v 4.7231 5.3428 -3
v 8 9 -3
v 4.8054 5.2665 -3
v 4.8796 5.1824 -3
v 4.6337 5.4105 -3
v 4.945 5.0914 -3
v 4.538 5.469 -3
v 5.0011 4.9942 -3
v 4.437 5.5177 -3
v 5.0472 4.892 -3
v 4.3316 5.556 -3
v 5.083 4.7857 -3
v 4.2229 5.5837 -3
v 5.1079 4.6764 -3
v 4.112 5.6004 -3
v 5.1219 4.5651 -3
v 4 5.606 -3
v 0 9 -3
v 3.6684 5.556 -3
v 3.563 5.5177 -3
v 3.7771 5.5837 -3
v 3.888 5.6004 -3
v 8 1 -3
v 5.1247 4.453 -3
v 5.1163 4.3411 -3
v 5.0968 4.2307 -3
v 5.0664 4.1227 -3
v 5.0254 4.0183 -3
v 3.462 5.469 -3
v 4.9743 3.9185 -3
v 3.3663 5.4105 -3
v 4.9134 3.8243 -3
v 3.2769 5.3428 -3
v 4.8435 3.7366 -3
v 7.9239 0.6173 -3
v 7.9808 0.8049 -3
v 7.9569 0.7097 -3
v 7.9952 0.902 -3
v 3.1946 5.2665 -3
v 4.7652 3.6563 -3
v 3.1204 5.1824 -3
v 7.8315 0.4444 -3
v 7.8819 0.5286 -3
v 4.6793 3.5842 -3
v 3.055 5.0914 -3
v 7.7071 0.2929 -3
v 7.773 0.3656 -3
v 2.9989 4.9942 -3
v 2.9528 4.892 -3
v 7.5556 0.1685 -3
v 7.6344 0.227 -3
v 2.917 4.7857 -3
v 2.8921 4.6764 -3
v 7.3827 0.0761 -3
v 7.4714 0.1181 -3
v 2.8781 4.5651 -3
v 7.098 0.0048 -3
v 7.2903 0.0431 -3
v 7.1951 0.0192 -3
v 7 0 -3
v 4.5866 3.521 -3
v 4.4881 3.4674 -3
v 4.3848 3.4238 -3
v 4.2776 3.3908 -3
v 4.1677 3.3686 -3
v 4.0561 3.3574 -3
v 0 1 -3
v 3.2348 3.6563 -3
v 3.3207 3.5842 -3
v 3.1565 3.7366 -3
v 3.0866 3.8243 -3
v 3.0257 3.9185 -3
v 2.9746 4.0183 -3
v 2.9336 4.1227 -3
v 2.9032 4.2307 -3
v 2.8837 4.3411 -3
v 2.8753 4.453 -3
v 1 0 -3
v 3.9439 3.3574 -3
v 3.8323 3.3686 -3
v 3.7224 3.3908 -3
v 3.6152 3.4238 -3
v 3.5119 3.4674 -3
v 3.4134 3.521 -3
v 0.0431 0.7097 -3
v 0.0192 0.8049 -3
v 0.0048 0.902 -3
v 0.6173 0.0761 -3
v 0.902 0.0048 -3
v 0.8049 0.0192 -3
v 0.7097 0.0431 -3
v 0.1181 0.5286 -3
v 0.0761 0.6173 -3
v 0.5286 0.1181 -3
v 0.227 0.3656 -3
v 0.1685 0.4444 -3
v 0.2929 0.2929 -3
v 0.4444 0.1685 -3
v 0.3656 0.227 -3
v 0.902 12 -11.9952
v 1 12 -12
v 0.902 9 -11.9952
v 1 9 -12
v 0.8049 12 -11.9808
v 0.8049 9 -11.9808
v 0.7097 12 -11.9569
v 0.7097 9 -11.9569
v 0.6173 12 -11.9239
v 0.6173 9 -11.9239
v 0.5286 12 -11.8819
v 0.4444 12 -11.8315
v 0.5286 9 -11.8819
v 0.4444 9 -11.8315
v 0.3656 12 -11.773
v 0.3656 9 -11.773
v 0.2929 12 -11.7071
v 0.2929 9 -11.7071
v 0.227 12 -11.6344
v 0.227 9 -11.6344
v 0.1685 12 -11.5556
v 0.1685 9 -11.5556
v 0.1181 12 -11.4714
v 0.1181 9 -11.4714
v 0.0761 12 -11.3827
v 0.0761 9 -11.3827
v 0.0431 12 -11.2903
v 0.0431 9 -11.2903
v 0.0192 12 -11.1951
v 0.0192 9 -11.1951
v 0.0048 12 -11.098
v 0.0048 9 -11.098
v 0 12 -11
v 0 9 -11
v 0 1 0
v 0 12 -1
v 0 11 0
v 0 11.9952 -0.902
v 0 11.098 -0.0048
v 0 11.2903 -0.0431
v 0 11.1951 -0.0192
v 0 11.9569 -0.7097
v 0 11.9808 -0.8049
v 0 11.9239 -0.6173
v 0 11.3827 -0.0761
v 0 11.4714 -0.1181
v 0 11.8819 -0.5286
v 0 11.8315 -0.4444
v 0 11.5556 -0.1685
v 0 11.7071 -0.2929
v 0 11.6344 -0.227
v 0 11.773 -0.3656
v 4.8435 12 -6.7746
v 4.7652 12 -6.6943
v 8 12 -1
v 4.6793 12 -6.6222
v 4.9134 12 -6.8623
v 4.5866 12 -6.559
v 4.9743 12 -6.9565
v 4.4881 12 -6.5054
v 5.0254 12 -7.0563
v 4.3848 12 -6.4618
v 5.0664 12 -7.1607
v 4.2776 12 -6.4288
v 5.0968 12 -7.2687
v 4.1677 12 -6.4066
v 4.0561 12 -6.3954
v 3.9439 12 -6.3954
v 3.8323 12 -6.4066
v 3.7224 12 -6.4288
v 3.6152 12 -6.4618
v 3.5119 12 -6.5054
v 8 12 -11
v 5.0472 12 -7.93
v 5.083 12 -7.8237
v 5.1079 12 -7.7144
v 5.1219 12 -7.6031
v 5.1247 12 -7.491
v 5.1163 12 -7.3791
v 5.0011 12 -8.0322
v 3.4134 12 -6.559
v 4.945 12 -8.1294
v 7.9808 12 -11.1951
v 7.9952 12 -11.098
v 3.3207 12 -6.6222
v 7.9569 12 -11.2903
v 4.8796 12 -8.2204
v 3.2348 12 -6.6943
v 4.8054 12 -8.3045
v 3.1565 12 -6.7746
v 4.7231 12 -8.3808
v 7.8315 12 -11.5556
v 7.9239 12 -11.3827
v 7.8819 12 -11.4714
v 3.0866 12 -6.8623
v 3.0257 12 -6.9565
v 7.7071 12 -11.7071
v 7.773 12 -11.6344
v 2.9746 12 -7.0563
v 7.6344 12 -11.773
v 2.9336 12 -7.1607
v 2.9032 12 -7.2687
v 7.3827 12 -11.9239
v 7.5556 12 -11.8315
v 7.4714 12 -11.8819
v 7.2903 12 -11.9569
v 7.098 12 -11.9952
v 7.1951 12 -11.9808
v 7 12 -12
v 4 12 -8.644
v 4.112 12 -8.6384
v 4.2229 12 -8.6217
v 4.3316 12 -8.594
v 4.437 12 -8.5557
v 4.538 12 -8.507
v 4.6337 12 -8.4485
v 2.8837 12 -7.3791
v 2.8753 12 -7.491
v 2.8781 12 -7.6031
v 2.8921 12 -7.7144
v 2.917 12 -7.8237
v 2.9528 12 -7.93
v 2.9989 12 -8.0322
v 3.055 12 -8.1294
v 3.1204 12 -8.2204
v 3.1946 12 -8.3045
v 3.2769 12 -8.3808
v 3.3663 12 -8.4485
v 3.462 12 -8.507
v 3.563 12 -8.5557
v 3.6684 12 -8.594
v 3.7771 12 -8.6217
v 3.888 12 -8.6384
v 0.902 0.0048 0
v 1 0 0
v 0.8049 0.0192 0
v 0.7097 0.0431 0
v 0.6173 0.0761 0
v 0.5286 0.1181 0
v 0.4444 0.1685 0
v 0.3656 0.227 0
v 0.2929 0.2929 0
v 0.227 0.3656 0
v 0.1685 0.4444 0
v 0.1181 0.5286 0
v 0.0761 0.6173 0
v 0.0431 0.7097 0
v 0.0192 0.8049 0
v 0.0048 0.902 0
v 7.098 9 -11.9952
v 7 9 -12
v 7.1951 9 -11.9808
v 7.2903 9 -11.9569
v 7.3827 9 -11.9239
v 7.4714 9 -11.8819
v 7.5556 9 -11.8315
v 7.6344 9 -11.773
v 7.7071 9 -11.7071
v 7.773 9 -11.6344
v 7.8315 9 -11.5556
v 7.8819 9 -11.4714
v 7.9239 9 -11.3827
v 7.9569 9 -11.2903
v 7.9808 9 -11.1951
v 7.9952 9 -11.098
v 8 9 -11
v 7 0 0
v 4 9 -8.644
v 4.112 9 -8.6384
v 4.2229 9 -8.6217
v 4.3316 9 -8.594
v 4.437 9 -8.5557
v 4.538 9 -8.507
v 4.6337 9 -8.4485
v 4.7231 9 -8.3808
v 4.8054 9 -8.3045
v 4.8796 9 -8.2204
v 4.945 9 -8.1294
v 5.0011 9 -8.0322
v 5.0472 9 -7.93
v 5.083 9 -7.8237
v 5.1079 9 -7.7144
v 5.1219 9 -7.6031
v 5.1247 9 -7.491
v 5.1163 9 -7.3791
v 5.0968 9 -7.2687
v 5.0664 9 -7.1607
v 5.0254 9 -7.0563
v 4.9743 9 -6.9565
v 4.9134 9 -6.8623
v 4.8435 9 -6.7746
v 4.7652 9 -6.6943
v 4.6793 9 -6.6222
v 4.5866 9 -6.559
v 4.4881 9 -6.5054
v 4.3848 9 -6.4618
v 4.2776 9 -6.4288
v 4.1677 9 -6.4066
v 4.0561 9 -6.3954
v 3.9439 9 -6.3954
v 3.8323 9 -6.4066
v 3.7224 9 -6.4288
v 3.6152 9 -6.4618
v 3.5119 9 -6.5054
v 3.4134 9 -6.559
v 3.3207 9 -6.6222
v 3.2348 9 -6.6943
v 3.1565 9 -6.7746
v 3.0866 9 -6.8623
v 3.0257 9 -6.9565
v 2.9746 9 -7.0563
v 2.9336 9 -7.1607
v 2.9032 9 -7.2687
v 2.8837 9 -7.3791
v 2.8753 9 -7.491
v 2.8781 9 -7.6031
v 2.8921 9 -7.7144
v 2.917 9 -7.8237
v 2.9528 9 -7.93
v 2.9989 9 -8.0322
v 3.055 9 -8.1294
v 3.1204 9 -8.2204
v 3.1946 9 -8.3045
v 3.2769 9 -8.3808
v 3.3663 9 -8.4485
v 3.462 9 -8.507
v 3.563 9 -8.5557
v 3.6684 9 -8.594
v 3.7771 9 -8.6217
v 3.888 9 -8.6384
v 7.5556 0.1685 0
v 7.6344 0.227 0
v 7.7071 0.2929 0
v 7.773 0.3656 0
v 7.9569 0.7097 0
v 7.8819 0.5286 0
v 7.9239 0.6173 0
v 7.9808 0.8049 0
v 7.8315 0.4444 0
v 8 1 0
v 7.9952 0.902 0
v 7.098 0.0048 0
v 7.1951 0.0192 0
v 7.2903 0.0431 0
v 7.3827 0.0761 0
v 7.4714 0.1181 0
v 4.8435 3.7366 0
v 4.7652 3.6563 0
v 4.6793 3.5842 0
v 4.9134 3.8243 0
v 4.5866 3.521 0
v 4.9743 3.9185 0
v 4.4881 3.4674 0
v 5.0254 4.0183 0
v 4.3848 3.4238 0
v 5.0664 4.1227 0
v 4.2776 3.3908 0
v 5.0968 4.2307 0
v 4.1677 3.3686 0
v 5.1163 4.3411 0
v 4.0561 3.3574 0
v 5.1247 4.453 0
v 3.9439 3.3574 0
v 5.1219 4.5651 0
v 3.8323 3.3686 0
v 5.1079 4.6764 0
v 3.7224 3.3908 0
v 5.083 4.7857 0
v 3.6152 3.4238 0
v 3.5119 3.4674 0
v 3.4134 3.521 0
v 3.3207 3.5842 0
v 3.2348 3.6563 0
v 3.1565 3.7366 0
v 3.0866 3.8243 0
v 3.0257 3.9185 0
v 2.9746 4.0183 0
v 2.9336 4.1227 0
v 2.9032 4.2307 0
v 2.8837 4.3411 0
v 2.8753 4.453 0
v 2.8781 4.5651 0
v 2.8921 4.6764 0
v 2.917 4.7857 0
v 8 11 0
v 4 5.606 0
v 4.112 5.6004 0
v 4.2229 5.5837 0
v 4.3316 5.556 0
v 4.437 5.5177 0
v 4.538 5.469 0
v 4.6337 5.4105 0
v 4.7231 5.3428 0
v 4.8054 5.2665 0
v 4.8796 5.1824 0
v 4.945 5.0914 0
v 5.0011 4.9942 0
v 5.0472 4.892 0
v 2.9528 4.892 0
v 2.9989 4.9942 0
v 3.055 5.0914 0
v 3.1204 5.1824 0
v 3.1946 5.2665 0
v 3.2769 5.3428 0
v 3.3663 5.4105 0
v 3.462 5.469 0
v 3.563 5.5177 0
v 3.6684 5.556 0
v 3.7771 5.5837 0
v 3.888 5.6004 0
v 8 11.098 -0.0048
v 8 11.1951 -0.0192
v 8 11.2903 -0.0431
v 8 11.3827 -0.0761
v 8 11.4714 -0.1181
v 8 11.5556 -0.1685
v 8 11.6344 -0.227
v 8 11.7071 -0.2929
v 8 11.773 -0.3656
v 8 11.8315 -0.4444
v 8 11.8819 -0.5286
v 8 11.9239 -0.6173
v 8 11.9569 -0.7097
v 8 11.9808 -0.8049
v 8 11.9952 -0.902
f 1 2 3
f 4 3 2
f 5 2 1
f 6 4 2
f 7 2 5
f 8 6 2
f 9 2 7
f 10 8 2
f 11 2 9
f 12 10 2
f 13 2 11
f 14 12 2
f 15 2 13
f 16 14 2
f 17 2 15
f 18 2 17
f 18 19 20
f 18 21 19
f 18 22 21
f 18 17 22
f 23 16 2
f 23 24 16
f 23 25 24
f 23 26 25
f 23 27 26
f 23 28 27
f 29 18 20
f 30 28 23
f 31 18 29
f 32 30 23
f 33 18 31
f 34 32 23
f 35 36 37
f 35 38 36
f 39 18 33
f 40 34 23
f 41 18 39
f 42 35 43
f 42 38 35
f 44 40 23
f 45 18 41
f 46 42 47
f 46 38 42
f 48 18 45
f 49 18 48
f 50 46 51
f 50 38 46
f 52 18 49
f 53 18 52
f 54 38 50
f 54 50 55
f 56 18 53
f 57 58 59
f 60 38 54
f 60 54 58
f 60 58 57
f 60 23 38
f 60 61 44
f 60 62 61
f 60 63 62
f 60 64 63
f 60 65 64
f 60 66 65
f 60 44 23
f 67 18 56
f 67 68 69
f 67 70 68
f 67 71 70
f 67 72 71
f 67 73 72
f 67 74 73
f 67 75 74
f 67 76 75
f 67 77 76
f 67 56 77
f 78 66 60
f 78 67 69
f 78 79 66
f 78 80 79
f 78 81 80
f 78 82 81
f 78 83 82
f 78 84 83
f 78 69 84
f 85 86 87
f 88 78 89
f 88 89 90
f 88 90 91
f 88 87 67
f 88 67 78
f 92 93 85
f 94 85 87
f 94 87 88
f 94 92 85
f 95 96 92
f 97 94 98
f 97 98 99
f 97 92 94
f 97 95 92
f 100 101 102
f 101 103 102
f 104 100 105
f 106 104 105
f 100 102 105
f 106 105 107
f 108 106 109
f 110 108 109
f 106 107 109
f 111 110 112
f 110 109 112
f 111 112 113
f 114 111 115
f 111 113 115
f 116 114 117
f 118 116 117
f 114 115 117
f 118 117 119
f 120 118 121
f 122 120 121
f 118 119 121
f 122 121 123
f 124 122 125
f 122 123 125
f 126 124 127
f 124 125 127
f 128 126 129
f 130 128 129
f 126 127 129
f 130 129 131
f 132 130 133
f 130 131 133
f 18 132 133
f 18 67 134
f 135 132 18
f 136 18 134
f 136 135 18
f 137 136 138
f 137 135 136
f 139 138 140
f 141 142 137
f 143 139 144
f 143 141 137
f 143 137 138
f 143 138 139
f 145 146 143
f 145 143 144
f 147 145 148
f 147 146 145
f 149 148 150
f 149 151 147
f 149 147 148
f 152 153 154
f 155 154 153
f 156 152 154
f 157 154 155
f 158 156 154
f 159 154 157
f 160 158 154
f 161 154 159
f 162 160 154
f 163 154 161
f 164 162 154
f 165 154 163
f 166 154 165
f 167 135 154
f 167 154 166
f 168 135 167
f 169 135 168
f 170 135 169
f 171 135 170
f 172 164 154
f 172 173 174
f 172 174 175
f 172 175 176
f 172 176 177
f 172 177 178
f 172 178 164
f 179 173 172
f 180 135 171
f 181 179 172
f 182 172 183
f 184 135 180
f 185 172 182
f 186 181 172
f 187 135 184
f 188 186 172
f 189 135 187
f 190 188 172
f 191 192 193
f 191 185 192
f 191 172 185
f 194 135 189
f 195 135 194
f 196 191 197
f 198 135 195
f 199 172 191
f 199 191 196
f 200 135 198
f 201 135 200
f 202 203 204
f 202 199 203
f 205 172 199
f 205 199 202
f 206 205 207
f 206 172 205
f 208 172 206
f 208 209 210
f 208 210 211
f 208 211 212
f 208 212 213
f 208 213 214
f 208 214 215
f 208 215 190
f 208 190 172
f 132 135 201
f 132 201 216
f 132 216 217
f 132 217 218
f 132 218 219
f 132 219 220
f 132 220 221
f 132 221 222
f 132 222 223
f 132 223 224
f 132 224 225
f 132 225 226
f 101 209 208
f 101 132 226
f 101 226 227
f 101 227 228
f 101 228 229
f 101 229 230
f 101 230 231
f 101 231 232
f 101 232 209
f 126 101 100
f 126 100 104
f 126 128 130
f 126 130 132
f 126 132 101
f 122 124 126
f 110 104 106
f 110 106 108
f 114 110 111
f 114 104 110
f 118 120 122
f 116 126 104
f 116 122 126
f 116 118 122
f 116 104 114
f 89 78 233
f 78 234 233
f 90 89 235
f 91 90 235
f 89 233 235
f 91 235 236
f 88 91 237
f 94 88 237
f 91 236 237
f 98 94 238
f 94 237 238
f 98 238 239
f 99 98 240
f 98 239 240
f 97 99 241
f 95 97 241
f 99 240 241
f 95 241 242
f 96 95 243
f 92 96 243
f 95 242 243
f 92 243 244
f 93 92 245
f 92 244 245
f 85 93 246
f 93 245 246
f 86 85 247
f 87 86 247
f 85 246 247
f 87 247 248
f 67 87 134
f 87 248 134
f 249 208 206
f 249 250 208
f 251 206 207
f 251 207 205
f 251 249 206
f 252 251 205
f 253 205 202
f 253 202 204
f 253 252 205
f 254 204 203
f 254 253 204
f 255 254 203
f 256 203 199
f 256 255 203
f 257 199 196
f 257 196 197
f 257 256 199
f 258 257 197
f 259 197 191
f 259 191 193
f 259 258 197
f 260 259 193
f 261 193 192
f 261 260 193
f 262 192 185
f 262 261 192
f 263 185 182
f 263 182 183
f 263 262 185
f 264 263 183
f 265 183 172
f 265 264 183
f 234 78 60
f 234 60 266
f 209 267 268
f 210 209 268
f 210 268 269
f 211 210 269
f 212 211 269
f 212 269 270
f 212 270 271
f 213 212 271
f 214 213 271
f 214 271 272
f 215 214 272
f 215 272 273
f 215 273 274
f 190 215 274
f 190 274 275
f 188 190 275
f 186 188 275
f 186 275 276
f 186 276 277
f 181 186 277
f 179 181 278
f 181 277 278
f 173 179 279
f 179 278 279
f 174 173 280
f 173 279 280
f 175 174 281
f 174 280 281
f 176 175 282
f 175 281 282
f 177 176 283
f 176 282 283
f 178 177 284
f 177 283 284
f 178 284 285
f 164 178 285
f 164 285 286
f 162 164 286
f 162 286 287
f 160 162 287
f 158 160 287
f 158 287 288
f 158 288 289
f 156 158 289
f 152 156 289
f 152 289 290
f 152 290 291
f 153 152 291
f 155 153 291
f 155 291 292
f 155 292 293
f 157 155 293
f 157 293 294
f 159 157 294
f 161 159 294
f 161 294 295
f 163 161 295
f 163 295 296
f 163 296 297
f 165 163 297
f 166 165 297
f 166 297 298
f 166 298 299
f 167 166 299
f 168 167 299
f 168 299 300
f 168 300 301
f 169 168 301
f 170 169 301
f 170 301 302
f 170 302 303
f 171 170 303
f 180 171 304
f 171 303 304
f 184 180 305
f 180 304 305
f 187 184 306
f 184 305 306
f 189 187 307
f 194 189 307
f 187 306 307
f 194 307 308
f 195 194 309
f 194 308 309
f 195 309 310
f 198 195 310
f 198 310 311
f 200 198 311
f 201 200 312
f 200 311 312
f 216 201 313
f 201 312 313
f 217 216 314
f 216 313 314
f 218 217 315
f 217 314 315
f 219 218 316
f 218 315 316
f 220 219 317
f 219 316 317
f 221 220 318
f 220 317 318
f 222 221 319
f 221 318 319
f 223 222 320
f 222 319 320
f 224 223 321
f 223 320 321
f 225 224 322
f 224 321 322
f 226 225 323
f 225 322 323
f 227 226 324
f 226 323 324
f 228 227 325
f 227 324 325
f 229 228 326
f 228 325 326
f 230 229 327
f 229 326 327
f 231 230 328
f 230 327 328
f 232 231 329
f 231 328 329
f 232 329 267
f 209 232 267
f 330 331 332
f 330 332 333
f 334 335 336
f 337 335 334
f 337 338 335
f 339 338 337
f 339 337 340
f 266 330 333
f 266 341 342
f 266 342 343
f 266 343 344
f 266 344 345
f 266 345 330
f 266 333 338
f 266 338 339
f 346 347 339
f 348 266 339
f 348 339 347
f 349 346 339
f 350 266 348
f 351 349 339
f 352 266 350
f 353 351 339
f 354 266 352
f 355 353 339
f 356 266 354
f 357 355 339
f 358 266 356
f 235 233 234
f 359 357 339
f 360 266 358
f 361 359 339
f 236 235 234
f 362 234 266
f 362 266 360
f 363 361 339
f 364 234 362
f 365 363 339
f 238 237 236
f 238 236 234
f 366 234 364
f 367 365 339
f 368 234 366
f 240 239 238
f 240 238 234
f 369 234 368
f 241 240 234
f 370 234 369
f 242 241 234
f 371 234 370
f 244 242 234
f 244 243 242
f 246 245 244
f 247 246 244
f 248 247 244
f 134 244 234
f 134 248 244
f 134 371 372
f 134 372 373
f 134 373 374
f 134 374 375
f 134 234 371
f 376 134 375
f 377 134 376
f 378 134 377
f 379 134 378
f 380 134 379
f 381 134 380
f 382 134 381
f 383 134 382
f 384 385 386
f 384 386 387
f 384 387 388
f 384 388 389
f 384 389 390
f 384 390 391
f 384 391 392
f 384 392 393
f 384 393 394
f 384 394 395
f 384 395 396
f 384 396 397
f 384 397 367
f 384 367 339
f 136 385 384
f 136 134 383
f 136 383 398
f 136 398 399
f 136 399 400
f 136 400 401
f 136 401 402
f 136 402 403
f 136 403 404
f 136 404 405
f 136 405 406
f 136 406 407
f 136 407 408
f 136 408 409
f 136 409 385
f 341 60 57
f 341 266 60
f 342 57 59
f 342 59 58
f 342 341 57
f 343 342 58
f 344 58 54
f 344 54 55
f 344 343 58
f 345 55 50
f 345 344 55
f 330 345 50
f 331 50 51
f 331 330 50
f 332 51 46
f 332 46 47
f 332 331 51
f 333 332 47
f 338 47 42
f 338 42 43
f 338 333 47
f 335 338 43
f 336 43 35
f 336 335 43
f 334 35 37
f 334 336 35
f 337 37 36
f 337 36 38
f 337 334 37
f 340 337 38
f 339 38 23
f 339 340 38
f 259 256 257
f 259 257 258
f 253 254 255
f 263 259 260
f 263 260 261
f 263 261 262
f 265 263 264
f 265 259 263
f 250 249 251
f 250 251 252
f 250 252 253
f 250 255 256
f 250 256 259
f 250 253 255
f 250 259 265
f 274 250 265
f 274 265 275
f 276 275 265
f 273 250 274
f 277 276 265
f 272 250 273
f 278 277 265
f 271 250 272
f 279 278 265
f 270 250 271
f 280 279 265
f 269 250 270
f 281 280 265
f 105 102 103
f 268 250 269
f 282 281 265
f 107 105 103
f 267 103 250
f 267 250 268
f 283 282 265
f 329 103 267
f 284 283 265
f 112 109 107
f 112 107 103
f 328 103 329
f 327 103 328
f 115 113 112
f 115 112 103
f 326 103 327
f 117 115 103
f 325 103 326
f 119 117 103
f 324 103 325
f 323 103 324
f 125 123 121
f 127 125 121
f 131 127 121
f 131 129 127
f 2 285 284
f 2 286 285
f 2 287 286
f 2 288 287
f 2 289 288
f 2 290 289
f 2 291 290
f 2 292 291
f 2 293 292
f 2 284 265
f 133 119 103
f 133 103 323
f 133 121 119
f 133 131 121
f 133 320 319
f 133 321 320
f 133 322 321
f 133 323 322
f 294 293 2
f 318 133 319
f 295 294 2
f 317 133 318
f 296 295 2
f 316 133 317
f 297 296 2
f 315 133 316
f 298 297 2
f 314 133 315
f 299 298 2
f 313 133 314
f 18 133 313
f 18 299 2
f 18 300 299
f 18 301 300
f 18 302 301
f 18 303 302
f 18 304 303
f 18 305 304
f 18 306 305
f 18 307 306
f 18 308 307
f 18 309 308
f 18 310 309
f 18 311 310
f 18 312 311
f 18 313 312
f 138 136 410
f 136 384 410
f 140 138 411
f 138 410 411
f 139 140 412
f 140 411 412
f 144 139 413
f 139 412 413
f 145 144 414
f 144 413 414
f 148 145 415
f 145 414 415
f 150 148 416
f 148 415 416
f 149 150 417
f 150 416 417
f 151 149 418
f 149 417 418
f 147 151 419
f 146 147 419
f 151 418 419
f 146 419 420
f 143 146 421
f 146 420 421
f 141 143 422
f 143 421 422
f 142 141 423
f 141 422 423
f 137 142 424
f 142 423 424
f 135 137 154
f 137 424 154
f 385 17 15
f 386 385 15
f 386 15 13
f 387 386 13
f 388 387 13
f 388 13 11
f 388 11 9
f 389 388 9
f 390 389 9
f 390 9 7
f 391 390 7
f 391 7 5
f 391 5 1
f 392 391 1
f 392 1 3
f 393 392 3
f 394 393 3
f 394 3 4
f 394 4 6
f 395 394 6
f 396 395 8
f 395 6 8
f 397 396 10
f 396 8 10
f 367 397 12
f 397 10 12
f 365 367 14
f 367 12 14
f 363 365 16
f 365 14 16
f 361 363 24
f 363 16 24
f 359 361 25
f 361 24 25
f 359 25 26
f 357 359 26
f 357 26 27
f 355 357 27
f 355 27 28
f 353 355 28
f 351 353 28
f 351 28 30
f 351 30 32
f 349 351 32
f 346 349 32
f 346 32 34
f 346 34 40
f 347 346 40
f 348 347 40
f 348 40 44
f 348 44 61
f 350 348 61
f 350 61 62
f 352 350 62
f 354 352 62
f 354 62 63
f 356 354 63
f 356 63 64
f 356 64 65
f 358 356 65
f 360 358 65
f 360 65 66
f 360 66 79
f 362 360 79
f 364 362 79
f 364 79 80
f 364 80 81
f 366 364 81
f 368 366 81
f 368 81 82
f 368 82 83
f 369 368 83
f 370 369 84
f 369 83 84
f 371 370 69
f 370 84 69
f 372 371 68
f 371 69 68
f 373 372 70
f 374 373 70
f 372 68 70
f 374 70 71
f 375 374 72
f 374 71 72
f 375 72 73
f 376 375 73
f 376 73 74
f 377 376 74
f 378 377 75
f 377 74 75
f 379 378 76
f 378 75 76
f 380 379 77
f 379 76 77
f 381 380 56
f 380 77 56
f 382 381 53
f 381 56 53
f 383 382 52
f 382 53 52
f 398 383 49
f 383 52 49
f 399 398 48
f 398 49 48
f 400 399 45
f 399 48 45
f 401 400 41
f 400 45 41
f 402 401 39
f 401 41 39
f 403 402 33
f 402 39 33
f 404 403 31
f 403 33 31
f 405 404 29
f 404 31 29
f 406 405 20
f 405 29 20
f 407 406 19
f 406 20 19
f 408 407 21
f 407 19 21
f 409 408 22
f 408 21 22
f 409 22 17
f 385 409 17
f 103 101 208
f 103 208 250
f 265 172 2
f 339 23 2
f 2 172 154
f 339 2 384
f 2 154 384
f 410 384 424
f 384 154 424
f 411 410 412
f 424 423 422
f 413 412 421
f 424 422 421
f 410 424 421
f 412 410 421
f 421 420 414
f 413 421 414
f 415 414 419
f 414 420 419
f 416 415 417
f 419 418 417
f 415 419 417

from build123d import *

# Parameters (mm, degrees)
SALIENTE_EXTRUIR1_DEPTH = 8
REDONDEO1_R             = 1
CROQUIS2_R              = 1.125
CORTAR_EXTRUIR1_DEPTH   = 18
CROQUIS3_R              = 1.125
CORTAR_EXTRUIR2_DEPTH   = 18
REDONDEO2_R             = 1


with BuildPart() as part:
    # Croquis1 → Saliente-Extruir1 (new body)
    with BuildSketch(Plane(origin=(0, 0, 0), x_dir=(0, 0, -1), z_dir=(1, 0, 0))):
        Polygon((0, 0), (0, 12), (12, 12), (12, 9), (3, 9), (3, 0), align=None)
    extrude(amount=SALIENTE_EXTRUIR1_DEPTH)

    # Redondeo1
    redondeo1_edges = [part.edges().sort_by_distance(p)[0] for p in [
        (8, 10.5, -12),
        (8, 0, -1.5),
        (0, 10.5, -12),
        (0, 0, -1.5),
    ]]
    fillet(redondeo1_edges, radius=REDONDEO1_R)

    # Croquis2 → Cortar-Extruir1 (cut, through all)
    with BuildSketch(Plane.XZ.offset(-9)):
        with Locations(Location((4, -7.519001503, 0), (0, 0, 270))):
            Circle(CROQUIS2_R)
    extrude(amount=-CORTAR_EXTRUIR1_DEPTH, mode=Mode.SUBTRACT)

    # Croquis3 → Cortar-Extruir2 (cut, through all)
    with BuildSketch(Plane(origin=(0, 0, -3), x_dir=(-1, 0, 0), z_dir=(0, 0, -1))):
        with Locations(Location((-4, 4.480998497, 0), (0, 0, 90))):
            Circle(CROQUIS3_R)
    extrude(amount=-CORTAR_EXTRUIR2_DEPTH, mode=Mode.SUBTRACT)

    # Redondeo2
    redondeo2_edges = [part.edges().sort_by_distance(p)[0] for p in [
        (4, 12, 0),
    ]]
    fillet(redondeo2_edges, radius=REDONDEO2_R)


solid = part.part
